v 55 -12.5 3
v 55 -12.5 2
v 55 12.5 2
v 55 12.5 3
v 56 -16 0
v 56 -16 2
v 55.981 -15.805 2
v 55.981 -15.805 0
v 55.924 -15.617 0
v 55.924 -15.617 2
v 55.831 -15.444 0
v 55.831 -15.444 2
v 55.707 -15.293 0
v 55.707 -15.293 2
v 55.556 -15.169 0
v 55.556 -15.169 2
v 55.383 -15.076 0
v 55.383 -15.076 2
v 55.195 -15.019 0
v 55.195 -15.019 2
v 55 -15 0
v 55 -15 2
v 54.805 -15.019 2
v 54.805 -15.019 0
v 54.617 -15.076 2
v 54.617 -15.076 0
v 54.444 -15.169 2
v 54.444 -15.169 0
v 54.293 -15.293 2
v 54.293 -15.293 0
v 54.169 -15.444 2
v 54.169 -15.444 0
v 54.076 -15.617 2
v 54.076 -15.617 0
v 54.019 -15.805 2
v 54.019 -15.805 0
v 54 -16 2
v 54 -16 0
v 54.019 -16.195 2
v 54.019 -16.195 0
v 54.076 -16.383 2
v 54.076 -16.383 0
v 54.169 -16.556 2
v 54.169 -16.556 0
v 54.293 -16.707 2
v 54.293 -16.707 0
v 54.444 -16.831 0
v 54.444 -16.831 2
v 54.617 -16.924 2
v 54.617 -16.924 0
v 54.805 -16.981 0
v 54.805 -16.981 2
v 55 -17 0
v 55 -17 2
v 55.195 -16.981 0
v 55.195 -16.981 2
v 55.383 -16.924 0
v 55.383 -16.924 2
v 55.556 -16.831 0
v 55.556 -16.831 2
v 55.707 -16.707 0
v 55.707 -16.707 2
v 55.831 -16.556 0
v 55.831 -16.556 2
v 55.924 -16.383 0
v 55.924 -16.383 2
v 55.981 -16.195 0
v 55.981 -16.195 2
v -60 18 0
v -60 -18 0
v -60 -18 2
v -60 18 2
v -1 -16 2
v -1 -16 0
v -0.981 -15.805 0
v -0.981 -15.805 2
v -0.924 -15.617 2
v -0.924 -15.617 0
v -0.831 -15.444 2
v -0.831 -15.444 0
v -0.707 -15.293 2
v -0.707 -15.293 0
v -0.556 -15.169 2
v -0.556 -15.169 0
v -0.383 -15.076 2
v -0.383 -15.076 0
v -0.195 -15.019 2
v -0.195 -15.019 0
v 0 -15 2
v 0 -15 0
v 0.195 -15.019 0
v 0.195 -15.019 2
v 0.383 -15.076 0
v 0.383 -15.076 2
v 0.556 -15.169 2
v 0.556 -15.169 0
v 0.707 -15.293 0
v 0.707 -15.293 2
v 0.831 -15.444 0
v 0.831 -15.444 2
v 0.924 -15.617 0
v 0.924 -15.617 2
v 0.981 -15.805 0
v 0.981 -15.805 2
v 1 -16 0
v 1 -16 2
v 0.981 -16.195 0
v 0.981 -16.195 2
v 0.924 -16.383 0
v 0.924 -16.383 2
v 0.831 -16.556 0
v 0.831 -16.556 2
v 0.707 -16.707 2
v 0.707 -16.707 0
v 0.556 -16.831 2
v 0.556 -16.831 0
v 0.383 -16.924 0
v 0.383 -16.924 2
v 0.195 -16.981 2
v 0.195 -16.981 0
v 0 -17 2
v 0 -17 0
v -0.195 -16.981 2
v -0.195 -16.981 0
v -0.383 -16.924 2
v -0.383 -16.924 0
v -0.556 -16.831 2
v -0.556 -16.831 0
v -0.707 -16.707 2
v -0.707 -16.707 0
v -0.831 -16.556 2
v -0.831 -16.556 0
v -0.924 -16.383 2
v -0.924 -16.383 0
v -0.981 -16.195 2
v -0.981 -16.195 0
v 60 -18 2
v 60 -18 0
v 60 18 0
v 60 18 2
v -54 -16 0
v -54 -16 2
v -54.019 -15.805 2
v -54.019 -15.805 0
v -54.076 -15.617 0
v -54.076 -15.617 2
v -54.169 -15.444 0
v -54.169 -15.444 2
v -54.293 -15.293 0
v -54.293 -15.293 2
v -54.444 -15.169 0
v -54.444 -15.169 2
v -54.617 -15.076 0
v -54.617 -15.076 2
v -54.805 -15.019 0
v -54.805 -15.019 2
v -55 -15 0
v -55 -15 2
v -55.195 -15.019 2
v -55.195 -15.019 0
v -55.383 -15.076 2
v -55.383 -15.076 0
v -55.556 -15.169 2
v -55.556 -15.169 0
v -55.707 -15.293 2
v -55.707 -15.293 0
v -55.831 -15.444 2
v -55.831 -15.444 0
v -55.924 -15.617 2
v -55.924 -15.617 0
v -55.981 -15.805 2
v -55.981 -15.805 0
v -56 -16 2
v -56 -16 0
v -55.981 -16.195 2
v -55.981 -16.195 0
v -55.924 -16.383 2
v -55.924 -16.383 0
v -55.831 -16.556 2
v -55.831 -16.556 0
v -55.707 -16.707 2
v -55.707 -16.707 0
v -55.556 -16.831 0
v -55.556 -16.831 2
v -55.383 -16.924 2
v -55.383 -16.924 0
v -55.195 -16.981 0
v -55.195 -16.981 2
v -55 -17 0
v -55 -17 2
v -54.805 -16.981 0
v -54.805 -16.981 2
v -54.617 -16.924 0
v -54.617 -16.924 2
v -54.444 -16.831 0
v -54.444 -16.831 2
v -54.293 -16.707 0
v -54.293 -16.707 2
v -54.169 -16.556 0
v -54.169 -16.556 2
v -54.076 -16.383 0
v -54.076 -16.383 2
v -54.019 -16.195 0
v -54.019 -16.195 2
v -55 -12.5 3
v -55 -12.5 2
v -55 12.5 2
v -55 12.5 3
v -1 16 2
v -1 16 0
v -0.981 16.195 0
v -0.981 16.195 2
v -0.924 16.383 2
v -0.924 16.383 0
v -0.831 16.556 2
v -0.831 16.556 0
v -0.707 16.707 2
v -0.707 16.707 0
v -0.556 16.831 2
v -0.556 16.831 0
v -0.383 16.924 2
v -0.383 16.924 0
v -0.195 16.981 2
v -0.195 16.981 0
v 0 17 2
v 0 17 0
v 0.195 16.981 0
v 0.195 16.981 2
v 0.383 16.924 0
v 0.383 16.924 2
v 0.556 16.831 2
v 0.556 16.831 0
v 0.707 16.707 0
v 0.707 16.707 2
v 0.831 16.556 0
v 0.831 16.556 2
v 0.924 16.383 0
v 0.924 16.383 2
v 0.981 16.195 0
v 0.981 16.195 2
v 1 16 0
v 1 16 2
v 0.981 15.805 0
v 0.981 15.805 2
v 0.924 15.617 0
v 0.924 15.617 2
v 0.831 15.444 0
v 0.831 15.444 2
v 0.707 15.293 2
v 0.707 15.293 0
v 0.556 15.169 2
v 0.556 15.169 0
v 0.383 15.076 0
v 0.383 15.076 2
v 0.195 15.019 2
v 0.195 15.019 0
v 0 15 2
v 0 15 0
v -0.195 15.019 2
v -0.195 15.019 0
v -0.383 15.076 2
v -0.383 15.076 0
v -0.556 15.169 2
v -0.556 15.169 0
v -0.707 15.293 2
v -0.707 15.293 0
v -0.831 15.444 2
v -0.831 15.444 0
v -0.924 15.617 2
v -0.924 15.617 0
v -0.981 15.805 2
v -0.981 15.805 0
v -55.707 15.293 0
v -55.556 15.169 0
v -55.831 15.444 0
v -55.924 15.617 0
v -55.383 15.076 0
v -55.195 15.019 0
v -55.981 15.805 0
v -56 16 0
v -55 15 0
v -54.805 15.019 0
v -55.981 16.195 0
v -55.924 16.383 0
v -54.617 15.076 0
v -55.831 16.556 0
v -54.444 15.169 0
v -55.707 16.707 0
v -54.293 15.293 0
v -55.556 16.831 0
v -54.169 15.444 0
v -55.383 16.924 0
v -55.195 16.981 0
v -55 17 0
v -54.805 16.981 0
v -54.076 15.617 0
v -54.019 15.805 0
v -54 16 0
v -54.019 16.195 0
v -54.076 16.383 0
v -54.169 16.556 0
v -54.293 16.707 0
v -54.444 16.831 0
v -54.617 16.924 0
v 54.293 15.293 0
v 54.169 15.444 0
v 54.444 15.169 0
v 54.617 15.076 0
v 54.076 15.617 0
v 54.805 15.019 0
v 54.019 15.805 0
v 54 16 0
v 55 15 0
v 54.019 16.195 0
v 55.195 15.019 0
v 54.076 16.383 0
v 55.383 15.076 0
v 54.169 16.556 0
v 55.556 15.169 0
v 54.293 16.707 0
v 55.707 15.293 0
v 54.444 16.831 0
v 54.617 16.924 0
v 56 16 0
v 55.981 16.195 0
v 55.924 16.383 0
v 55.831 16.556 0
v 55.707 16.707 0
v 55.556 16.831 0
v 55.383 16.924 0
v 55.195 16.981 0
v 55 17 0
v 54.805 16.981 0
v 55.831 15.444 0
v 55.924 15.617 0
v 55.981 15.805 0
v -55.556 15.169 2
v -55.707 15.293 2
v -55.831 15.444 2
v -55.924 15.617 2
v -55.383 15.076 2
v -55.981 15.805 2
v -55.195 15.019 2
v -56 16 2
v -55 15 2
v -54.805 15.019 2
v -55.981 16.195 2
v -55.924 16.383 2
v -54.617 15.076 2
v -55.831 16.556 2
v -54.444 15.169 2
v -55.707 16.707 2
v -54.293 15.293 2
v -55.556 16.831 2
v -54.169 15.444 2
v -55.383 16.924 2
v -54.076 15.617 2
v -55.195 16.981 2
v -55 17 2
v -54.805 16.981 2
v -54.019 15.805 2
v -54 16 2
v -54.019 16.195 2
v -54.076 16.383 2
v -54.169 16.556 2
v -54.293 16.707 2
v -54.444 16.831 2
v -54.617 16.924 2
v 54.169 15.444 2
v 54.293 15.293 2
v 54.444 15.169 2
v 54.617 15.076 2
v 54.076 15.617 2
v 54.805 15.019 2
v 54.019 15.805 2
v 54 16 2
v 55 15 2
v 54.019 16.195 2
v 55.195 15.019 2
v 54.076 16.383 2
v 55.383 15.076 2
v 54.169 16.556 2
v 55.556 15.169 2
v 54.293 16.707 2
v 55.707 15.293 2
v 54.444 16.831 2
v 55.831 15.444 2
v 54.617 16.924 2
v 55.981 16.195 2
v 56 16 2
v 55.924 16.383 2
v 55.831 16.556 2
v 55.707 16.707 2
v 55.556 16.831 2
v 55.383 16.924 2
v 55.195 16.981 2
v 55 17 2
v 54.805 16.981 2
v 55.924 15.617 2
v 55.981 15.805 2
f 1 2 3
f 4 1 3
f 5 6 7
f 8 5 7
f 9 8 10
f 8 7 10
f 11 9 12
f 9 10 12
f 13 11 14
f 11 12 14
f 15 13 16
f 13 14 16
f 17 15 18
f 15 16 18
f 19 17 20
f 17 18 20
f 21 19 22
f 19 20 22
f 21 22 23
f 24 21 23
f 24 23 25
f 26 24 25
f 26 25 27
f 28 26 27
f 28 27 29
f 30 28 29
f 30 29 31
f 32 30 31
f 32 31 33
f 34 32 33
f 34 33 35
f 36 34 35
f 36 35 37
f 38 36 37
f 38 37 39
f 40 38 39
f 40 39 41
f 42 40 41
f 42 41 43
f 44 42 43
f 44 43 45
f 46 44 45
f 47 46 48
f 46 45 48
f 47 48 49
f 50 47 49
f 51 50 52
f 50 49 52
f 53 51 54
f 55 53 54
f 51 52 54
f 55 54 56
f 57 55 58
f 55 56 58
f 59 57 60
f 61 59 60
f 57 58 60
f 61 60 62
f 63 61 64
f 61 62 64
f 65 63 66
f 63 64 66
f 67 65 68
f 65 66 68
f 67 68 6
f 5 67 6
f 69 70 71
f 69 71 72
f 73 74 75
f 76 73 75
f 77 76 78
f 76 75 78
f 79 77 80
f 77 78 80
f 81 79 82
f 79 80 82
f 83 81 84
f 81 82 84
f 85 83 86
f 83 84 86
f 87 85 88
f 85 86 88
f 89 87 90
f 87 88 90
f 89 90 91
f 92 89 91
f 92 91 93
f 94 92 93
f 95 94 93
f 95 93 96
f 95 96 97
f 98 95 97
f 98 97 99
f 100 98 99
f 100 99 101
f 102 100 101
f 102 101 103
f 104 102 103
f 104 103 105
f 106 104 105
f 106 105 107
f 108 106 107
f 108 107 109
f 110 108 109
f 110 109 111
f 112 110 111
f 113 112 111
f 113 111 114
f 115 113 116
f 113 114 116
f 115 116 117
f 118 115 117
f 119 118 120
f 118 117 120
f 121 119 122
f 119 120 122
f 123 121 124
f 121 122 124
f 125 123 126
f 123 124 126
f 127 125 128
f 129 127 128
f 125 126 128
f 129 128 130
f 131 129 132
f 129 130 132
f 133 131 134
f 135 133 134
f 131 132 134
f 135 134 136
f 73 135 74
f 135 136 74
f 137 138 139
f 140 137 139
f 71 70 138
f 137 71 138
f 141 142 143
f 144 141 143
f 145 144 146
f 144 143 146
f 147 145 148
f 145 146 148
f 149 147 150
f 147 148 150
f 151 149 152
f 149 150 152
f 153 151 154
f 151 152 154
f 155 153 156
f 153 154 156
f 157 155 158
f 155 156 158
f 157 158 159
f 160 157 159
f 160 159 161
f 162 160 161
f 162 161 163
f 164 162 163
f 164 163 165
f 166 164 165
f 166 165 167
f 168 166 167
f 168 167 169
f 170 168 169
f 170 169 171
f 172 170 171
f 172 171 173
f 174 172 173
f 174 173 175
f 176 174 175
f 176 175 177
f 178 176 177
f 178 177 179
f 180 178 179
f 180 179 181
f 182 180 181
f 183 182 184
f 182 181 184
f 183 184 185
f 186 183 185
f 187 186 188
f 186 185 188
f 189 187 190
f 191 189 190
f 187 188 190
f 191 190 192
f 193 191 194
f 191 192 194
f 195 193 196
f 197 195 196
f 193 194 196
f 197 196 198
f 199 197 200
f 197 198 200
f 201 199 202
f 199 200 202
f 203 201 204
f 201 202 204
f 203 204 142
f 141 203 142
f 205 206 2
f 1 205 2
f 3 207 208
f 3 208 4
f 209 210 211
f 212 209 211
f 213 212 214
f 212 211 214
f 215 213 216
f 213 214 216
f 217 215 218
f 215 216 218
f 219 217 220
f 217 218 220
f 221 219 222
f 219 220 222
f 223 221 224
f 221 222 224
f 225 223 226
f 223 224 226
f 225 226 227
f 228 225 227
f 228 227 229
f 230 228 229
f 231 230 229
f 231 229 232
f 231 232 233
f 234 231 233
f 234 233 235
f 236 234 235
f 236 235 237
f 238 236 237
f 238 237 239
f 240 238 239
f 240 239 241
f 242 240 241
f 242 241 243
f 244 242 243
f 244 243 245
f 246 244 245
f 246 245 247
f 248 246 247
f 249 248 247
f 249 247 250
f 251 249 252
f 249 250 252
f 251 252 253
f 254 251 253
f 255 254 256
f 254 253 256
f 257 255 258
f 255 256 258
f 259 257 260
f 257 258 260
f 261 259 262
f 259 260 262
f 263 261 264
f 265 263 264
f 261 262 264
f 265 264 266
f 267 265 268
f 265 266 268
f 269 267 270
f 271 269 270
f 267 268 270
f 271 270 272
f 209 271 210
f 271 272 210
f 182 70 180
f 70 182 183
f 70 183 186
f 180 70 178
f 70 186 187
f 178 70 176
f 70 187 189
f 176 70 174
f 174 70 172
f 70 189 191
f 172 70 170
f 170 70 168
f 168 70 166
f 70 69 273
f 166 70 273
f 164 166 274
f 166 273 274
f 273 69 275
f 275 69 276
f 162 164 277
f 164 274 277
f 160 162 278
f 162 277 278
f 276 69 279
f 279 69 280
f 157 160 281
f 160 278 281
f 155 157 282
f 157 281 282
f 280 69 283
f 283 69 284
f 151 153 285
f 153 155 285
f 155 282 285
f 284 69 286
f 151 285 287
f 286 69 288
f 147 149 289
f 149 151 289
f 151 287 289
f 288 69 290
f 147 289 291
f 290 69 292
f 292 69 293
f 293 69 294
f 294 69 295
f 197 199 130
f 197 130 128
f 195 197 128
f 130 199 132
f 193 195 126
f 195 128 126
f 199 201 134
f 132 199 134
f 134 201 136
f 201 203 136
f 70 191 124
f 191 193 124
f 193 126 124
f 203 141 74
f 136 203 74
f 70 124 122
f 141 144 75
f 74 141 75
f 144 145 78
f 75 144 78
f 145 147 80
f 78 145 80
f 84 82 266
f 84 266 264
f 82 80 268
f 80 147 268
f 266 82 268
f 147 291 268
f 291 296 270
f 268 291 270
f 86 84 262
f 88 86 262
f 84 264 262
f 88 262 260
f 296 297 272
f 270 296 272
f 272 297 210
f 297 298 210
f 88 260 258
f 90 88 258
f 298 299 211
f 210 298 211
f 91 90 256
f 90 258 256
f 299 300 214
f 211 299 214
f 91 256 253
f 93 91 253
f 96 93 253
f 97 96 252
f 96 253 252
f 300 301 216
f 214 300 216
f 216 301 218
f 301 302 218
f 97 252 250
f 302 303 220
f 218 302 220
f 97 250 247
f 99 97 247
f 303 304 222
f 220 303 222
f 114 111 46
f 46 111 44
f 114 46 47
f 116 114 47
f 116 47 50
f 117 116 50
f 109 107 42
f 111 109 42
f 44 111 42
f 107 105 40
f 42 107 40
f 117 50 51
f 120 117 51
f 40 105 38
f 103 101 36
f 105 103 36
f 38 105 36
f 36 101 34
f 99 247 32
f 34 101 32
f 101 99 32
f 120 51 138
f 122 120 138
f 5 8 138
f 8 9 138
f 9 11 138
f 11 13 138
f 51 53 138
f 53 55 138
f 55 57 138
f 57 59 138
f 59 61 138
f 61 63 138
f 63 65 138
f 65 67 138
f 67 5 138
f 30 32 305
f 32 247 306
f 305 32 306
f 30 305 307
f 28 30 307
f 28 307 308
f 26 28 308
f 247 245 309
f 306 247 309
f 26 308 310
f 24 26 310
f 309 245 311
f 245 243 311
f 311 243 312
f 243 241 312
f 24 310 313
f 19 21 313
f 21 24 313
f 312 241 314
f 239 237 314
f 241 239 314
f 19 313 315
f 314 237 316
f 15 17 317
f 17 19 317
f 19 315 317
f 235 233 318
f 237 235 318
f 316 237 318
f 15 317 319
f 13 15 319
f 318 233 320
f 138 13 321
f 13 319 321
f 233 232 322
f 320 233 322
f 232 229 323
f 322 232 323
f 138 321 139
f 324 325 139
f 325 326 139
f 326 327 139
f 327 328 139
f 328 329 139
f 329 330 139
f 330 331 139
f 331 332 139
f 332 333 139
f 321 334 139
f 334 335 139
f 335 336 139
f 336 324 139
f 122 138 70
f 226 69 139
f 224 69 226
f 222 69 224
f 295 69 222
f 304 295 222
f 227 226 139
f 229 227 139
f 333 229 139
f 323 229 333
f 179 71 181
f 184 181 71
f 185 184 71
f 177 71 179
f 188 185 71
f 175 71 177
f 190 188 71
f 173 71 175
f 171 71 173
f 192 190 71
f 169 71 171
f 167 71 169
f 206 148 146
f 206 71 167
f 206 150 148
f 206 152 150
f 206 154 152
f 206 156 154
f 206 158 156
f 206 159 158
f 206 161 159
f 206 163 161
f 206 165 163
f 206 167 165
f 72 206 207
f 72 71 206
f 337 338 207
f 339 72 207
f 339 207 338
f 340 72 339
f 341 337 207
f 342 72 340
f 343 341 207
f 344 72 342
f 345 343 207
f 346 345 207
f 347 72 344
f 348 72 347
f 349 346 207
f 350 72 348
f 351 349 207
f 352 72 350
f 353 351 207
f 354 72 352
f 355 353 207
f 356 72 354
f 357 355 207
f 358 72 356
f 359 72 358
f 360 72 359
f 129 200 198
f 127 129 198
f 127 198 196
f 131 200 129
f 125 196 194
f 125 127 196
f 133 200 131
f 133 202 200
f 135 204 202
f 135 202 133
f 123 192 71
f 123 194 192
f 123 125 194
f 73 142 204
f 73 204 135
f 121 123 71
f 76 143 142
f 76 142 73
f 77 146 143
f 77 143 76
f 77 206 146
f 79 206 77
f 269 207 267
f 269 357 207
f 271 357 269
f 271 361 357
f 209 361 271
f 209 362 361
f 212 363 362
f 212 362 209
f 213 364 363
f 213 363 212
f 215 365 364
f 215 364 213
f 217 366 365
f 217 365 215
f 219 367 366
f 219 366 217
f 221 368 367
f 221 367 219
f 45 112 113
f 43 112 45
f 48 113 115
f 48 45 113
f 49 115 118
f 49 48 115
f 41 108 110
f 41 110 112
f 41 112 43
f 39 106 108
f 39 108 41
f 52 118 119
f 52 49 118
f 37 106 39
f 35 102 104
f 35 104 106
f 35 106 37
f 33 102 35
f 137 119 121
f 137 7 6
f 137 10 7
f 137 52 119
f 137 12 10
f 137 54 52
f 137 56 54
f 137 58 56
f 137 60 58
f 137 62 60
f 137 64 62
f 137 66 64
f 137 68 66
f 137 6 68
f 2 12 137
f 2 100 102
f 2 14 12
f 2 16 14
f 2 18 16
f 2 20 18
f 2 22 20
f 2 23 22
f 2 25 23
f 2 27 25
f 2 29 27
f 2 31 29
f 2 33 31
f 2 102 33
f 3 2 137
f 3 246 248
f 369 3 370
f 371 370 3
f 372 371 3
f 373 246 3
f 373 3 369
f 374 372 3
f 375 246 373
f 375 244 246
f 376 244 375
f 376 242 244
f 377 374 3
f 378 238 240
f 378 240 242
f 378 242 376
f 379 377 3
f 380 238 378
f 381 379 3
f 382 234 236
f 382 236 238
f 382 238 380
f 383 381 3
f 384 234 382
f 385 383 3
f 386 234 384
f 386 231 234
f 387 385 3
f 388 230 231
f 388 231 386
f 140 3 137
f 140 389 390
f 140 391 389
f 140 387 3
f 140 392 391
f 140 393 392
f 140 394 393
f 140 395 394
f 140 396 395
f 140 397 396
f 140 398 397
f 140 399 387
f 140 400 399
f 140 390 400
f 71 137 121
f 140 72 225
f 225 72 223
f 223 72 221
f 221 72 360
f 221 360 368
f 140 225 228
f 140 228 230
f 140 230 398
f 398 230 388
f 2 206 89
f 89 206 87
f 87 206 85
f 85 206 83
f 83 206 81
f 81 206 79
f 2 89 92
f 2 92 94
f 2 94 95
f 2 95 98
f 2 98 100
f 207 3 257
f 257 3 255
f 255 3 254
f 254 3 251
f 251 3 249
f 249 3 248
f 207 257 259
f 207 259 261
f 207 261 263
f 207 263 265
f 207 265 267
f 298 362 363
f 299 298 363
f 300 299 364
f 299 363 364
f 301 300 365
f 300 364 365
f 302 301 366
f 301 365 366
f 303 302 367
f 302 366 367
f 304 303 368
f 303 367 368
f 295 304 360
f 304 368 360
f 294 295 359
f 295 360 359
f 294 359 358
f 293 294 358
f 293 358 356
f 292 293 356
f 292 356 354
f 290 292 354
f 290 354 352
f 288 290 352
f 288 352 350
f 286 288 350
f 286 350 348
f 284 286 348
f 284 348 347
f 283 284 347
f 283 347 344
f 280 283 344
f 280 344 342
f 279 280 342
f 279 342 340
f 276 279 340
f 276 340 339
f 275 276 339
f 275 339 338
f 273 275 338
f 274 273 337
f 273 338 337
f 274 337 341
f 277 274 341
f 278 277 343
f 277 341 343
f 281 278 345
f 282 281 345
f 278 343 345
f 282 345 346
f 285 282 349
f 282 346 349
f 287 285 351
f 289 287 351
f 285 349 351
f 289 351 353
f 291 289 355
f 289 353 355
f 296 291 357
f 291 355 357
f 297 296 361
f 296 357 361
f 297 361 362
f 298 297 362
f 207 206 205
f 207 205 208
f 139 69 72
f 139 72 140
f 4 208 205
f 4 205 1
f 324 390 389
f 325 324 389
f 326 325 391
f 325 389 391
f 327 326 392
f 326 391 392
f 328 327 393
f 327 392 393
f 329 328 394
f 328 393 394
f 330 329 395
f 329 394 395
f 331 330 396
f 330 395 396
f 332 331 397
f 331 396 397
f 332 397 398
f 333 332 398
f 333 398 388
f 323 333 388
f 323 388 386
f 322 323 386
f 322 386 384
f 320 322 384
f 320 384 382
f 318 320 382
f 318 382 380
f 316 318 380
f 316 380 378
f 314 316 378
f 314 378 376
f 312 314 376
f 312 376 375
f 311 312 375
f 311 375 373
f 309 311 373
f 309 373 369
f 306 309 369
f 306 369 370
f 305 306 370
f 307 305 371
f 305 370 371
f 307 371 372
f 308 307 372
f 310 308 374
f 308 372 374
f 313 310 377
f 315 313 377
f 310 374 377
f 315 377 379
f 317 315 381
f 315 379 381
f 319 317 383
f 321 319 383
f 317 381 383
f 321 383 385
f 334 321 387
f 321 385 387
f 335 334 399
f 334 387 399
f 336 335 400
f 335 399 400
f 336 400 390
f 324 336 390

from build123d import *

# Parameters (mm, degrees)
SKETCH1_W           = 120
SKETCH1_H           = 36
BOSS_EXTRUDE1_DEPTH = 2
SKETCH2_W           = 110
SKETCH2_H           = 25
BOSS_EXTRUDE2_DEPTH = 1
SKETCH3_R           = 1
CUT_EXTRUDE1_DEPTH  = 63.673758464
SKETCH4_R           = 1
CUT_EXTRUDE2_DEPTH  = 10


with BuildPart() as part:
    # Sketch1 → Boss-Extrude1 (new body)
    with BuildSketch(Plane.XY):
        Rectangle(SKETCH1_W, SKETCH1_H)
    extrude(amount=BOSS_EXTRUDE1_DEPTH)

    # Sketch2 → Boss-Extrude2 (add)
    with BuildSketch(Plane.XY.offset(2)):
        Rectangle(SKETCH2_W, SKETCH2_H)
    extrude(amount=BOSS_EXTRUDE2_DEPTH)

    # Sketch3 → Cut-Extrude1 (cut, through all)
    with BuildSketch(Plane.XY.offset(2)):
        with Locations((-55, 16)):
            Circle(SKETCH3_R)
        with Locations((-55, -16)):
            Circle(SKETCH3_R)
        with Locations((55, 16)):
            Circle(SKETCH3_R)
        with Locations((55, -16)):
            Circle(SKETCH3_R)
    extrude(amount=-CUT_EXTRUDE1_DEPTH, mode=Mode.SUBTRACT)

    # Sketch4 → Cut-Extrude2 (cut)
    with BuildSketch(Plane(origin=(0, 0, 0), x_dir=(-1, 0, 0), z_dir=(0, 0, -1))):
        with Locations((0, 16)):
            Circle(SKETCH4_R)
        with Locations((0, -16)):
            Circle(SKETCH4_R)
    extrude(amount=-CUT_EXTRUDE2_DEPTH, mode=Mode.SUBTRACT)


solid = part.part
